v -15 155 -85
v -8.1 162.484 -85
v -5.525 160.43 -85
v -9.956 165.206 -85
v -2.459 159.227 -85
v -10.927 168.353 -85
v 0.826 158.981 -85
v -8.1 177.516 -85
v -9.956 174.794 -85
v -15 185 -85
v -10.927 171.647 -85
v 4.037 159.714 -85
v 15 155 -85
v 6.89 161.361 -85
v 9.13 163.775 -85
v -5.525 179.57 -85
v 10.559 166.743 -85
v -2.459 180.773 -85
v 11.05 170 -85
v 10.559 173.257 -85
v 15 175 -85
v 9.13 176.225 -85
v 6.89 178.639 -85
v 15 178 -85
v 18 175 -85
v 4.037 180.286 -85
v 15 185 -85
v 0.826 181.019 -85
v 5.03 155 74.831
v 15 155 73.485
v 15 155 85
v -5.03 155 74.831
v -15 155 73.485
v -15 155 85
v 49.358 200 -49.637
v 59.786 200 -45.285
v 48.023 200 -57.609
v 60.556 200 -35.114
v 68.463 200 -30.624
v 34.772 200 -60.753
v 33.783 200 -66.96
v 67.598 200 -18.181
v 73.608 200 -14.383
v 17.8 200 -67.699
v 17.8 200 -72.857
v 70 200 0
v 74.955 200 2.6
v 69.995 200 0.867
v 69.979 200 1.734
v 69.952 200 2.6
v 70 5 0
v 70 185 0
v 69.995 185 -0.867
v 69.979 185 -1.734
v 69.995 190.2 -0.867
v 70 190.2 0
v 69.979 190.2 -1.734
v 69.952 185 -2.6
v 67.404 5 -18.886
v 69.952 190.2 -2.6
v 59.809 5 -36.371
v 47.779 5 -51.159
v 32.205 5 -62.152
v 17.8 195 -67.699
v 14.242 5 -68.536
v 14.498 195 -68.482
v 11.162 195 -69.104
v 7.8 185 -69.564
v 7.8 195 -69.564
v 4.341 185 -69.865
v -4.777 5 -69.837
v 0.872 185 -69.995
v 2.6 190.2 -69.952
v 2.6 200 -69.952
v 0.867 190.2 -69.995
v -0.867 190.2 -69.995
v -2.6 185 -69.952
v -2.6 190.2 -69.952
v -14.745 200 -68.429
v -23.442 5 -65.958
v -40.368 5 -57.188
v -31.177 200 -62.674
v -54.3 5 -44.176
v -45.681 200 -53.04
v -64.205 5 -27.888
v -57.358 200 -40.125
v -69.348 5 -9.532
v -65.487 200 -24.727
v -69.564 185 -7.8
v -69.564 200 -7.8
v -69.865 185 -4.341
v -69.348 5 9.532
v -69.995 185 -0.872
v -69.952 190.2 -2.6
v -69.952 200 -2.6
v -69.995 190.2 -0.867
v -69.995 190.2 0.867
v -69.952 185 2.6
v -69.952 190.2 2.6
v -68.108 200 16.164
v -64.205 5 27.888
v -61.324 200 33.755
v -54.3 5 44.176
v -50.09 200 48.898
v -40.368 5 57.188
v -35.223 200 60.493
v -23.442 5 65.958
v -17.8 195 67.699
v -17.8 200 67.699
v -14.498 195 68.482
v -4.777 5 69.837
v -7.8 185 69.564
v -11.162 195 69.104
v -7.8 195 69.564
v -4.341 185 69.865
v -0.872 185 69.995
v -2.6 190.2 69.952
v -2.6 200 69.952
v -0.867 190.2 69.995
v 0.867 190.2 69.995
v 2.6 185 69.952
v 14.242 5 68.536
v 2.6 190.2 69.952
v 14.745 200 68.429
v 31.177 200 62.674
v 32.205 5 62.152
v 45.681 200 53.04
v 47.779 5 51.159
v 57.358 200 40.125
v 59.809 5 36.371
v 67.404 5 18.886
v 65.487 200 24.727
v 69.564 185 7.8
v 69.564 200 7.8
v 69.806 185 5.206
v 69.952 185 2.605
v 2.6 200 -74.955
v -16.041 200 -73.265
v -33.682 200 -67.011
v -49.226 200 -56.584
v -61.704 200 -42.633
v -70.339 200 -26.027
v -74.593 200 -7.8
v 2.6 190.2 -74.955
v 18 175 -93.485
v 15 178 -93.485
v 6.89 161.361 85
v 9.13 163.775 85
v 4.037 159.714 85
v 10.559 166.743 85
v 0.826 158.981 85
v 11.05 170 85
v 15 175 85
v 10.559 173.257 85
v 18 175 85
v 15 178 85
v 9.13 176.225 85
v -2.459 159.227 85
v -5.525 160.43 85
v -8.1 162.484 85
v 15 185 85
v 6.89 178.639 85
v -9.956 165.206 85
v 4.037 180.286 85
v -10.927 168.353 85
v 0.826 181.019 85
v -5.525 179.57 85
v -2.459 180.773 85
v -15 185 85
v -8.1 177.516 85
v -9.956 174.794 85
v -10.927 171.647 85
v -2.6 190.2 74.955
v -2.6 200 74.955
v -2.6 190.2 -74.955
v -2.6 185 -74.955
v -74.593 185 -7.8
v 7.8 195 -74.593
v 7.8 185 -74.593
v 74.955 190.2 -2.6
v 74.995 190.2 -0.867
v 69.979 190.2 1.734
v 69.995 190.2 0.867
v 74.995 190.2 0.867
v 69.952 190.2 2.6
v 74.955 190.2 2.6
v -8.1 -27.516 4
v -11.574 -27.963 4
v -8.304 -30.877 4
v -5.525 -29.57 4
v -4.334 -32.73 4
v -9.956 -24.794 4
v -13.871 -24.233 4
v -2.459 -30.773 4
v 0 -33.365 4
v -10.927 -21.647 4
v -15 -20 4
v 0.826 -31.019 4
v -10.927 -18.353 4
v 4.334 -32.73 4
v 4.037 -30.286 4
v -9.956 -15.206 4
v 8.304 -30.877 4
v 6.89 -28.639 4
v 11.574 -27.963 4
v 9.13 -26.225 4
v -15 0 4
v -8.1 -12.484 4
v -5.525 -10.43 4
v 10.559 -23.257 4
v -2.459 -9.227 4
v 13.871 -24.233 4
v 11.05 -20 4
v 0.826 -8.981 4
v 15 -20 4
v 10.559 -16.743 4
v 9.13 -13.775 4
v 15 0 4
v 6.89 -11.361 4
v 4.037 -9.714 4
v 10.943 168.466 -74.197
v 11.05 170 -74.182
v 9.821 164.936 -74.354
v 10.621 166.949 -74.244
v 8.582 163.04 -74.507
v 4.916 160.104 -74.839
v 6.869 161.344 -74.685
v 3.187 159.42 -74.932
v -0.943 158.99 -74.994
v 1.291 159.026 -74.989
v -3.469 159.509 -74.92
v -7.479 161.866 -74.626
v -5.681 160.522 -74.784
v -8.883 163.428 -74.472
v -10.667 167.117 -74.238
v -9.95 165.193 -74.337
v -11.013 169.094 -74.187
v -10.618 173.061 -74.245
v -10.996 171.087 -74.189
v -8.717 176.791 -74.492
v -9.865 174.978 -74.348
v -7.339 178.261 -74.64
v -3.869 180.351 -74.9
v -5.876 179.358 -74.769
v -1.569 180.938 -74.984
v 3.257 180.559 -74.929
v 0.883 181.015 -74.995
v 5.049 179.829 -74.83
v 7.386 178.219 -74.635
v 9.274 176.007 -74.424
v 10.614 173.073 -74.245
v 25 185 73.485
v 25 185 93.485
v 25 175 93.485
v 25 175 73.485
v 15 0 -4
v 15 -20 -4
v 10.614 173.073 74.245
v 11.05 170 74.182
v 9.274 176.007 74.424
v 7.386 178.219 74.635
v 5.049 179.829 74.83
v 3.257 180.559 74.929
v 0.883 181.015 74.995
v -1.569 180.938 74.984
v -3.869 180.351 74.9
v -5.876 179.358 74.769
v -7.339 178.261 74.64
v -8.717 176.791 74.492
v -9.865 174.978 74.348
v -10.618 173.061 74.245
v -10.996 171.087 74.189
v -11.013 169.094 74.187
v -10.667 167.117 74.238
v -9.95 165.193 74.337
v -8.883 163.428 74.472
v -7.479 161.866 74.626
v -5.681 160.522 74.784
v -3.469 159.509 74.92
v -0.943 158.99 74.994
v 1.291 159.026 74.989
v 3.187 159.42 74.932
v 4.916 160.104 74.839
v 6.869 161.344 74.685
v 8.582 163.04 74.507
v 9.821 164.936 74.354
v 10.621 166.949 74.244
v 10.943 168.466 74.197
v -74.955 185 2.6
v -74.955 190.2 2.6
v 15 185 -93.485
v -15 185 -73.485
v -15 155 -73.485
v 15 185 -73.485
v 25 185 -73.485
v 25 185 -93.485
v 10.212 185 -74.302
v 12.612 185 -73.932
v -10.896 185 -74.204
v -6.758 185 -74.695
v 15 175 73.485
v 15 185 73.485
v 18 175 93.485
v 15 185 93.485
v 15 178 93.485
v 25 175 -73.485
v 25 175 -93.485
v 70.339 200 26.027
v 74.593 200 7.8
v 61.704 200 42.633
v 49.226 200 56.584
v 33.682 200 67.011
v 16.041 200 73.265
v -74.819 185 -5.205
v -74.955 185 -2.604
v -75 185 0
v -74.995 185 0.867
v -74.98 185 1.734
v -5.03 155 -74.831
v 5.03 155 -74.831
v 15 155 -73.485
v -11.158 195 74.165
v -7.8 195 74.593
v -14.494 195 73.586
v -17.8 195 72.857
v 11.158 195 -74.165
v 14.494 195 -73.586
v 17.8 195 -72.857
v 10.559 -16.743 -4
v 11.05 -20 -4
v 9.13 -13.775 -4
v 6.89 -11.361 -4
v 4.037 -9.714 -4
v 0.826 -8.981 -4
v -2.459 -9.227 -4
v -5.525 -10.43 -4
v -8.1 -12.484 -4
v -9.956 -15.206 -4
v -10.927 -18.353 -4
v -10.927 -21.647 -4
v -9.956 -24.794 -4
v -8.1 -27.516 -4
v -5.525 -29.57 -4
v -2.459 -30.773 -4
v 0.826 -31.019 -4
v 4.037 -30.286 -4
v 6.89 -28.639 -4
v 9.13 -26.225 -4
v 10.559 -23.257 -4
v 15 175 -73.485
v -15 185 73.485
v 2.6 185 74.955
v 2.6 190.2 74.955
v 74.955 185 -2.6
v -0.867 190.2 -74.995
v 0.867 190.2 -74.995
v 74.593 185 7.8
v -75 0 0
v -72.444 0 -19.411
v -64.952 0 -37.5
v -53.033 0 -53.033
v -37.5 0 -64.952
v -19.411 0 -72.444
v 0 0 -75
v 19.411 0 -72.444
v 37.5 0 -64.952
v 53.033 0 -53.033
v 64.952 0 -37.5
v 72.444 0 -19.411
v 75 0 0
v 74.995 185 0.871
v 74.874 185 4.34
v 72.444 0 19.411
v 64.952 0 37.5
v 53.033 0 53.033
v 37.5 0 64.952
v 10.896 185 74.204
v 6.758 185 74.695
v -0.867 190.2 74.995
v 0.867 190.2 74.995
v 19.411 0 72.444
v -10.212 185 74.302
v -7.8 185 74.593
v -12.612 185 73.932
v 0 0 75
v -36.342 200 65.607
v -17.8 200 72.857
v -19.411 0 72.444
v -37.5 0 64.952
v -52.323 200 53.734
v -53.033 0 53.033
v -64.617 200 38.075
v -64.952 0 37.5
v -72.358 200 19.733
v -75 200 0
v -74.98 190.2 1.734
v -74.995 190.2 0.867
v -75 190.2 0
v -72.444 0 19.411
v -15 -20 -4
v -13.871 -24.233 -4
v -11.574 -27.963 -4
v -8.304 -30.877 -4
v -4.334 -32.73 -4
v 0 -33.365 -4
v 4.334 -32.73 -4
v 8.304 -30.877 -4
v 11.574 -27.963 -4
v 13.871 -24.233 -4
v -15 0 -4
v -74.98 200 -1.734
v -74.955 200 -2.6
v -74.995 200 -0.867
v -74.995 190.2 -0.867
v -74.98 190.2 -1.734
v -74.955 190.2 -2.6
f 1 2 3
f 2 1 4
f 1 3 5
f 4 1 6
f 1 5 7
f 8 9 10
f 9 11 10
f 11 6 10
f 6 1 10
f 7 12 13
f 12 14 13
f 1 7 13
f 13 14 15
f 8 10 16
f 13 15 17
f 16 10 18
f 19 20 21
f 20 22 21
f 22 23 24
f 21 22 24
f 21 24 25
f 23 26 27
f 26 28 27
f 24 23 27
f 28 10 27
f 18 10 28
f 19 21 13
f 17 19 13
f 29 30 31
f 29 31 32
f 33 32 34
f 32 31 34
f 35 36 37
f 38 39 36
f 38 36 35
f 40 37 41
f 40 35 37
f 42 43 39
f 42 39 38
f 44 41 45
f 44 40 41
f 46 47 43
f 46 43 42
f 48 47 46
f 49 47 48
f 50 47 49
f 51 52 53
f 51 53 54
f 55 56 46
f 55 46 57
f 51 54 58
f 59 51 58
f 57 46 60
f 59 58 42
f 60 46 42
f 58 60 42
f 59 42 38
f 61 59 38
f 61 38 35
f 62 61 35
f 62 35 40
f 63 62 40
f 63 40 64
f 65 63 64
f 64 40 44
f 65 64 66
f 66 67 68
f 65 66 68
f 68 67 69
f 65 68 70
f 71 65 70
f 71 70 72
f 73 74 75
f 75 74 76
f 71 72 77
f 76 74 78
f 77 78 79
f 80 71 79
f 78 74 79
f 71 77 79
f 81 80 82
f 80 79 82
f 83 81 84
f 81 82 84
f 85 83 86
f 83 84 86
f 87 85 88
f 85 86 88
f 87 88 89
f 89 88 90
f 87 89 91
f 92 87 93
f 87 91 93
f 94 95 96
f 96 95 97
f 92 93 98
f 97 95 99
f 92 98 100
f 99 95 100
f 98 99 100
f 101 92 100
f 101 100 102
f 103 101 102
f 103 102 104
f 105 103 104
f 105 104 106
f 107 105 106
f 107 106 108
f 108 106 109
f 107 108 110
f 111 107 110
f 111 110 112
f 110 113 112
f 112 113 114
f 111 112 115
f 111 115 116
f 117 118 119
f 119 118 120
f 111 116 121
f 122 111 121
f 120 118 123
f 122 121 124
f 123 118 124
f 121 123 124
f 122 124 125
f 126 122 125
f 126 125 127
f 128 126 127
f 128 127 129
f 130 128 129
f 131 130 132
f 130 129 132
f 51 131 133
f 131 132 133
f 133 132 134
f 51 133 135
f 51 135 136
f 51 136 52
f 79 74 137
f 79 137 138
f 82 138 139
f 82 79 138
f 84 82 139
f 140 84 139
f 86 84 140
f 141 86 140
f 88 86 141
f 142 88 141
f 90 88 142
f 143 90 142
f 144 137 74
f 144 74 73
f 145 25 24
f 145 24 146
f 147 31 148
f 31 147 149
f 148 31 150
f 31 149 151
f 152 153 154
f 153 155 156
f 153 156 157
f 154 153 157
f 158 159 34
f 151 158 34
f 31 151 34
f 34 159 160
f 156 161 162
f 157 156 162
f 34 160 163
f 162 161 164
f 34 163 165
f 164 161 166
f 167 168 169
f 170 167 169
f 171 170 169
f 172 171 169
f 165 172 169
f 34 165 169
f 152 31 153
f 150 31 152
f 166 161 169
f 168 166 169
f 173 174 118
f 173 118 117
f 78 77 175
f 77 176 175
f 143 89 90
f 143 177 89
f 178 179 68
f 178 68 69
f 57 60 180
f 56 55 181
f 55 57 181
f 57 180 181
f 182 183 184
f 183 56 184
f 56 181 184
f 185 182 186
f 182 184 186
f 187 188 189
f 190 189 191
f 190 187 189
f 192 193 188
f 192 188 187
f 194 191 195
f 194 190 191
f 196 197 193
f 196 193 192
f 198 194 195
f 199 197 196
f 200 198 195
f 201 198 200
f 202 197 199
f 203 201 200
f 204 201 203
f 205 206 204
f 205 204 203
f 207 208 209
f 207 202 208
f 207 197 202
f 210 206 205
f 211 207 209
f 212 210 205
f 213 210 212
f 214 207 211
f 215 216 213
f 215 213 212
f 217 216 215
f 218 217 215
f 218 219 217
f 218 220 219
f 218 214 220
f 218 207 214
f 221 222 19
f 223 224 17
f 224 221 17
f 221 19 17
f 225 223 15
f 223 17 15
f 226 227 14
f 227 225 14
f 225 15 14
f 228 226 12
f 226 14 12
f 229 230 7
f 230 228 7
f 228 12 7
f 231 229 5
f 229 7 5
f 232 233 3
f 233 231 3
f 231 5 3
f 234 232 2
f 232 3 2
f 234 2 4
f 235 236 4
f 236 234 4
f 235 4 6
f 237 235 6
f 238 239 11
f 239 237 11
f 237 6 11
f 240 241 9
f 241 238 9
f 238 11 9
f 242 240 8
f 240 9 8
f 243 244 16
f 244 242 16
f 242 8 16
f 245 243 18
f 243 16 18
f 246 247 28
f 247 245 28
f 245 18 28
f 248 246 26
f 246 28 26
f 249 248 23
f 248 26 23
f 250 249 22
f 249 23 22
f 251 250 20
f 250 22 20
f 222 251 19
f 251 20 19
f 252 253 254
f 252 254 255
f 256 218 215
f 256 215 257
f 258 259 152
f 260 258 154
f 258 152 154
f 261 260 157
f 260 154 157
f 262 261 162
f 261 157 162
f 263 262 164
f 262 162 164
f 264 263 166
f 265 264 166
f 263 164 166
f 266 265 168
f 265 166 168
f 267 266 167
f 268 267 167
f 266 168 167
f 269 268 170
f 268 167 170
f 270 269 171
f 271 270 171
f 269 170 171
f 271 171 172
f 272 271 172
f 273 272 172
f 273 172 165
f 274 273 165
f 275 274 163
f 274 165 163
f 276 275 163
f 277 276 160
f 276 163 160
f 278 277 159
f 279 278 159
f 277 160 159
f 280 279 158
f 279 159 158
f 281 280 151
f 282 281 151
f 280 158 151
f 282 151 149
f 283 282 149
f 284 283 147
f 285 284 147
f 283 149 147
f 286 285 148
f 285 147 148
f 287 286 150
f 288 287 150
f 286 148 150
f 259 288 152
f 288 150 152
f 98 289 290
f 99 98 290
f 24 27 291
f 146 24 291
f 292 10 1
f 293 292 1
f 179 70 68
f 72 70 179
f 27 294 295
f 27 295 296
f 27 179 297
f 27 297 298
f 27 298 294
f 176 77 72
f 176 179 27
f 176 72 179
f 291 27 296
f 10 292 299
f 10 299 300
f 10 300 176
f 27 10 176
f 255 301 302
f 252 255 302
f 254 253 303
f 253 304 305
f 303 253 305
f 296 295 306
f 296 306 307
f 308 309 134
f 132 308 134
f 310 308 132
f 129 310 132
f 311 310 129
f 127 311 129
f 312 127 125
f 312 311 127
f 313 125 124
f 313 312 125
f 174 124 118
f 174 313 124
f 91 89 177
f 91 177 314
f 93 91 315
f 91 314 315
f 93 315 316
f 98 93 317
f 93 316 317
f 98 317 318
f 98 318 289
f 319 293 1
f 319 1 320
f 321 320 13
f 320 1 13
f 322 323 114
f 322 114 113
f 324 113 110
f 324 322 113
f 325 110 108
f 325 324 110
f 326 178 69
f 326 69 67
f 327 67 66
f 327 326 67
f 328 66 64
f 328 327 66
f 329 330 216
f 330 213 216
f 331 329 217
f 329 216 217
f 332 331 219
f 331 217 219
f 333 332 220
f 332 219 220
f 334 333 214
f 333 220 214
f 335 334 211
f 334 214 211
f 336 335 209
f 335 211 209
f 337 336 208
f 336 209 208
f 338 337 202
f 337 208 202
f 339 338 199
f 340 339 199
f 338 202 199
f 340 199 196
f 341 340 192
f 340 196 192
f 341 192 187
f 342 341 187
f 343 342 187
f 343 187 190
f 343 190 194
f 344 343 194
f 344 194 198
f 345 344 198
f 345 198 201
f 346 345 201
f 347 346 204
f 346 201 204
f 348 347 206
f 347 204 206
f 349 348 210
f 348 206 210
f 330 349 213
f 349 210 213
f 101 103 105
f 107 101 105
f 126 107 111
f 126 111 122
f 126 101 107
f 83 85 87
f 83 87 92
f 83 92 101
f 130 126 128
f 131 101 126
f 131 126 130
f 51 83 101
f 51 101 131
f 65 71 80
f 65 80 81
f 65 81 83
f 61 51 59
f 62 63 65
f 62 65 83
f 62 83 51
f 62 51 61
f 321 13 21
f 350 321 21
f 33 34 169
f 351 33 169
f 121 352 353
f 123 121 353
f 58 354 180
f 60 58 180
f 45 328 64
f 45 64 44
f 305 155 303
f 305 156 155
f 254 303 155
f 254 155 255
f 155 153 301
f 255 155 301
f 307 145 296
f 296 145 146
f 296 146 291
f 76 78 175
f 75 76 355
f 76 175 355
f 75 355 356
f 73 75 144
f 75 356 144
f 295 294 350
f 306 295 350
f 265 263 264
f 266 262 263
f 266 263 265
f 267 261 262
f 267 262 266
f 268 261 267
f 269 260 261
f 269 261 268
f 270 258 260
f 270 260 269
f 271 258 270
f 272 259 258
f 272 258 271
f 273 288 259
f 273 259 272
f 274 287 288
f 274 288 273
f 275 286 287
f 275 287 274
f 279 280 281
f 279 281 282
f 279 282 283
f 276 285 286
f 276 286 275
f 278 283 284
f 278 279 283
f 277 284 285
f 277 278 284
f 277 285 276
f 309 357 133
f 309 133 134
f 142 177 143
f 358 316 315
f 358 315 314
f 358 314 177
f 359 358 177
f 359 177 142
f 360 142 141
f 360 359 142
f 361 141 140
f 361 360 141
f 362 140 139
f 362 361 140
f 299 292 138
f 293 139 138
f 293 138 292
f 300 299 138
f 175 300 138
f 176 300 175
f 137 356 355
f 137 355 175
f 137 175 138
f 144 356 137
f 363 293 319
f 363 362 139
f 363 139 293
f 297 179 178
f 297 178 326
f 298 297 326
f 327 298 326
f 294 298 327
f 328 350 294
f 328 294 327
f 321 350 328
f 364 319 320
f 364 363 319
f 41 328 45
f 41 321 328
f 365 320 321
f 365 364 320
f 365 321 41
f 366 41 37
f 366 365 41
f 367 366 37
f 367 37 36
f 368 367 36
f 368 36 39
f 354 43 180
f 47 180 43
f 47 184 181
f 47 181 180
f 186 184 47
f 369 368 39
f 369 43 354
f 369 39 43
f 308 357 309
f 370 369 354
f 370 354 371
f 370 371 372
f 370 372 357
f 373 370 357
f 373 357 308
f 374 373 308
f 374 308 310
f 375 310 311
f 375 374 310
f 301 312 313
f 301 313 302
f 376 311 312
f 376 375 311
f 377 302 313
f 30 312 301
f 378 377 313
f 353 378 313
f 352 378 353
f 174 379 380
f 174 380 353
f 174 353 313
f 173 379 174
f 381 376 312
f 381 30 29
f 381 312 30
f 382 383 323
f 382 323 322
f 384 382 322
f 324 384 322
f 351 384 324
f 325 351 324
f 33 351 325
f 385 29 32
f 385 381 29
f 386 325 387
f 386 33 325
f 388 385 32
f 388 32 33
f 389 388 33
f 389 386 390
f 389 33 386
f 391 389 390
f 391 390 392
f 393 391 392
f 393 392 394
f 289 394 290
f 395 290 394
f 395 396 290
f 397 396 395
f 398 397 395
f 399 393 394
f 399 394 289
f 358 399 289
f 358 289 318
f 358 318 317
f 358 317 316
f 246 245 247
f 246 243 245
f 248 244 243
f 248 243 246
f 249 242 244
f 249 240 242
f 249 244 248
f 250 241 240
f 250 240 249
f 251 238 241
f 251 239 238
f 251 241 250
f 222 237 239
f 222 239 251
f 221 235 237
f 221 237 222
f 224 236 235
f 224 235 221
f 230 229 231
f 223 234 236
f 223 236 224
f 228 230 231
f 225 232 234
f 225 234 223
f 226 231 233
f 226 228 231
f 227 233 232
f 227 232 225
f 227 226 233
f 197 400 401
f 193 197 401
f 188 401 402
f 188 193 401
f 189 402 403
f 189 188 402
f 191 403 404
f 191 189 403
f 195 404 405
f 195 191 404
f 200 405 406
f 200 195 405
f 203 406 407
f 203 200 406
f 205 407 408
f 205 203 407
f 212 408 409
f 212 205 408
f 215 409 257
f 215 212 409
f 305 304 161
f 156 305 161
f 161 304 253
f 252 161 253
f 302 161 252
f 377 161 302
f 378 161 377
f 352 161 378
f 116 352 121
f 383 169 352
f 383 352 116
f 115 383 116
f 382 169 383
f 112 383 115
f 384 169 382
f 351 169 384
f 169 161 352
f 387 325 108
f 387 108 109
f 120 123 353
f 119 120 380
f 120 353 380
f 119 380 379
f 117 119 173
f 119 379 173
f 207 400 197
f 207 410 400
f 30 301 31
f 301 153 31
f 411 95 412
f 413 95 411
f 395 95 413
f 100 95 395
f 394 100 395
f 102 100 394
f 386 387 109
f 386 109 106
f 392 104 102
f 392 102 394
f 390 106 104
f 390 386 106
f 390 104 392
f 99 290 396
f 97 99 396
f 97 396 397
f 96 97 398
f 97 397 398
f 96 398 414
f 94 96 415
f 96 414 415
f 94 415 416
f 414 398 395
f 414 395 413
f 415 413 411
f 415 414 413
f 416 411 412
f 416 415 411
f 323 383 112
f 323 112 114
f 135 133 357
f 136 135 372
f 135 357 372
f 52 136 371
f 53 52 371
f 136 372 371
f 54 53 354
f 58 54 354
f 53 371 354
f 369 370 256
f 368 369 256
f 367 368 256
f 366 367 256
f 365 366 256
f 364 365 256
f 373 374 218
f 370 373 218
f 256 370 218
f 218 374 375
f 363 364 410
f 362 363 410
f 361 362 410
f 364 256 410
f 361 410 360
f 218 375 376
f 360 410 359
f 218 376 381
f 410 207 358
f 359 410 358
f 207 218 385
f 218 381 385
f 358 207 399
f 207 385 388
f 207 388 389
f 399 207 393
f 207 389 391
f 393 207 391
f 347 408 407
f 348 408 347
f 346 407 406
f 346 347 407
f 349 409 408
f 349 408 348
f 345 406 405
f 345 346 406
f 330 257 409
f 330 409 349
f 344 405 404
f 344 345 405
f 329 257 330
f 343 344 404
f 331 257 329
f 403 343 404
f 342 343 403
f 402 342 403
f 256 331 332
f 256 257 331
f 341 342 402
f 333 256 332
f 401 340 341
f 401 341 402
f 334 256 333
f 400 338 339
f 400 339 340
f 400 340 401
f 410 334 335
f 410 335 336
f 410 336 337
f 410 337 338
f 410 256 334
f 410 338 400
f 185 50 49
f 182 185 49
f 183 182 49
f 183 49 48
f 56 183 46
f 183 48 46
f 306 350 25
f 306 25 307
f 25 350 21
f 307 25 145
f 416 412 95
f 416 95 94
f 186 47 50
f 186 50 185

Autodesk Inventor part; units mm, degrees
ref_plane "YZ Plane" through (0, 0, 0) normal (1, 0, 0) x (0, 1, 0)
ref_plane "XZ Plane" through (0, 0, 0) normal (0, 1, 0) x (-1, 0, 0)
sketch "Sketch1" plane through (0, 0, 0) normal (0, 1, 0) x (-1, 0, 0)
  circle A0 centre (0, 0) radius 75
  dimension "d0" = 150
extrude "Extrusion1" add sketch "Sketch1" along normal blind 200
sketch "Sketch2" plane through (0, 200, 0) normal (0, 1, 0) x (1, 0, 0)
  circle A0 centre (0, 0) radius 75 projected
  circle A1 centre (0, 0) radius 70
  dimension "d3" = 5
extrude "Extrusion2" cut sketch "Sketch2" against normal blind 195 contours A1
ref_plane "Work Plane1" through (0, 0, -75) normal (0, 0, 1) x (1, 0, 0)
sketch "Sketch4" plane through (0, 0, -75) normal (0, 0, 1) x (1, 0, 0)
  line L0 (15, 185) -> (-15, 185)
  line L1 (-15, 185) -> (-15, 155)
  line L2 (-15, 155) -> (15, 155)
  line L3 (15, 155) -> (15, 185)
  line L4 (15, 185) -> (-15, 155) construction
  line L5 (-15, 185) -> (15, 155) construction
  line L6 (75, 200) -> (-75, 200) construction
  line L7 (0, 170) -> (0, 200) construction
  circle A0 centre (0, 170) radius 11.05
  point P0 (0, 0)
  dimension "d8" = 30
  dimension "d9" = 30
  dimension "d10" = 30
  dimension "d15" = 22.1
extrude "Extrusion3" add sketch "Sketch4" along normal blind 3 and the other way blind 10
mirror "Mirror1" about plane through (0, 0, 0) normal (0, 0, 1) of "Extrusion3"
sketch "Sketch5" plane through (0, 0, 0) normal (0, -1, 0) x (1, 0, 0)
  line L0 (15, -4) -> (-15, -4)
  line L1 (-15, -4) -> (-15, 4)
  line L2 (-15, 4) -> (15, 4)
  line L3 (15, 4) -> (15, -4)
  line L4 (15, -4) -> (-15, 4) construction
  line L5 (-15, -4) -> (15, 4) construction
  circle A0 centre (0, 0) radius 75 projected
  dimension "d27" = 30
  dimension "d28" = 8
extrude "Extrusion4" add sketch "Sketch5" along normal blind 35 contours L0 L1 L2 L3
sketch "Sketch7" plane through (-15, 0, 4) normal (0, 0, 1) x (1, 0, 0)
  circle A0 centre (15, -20) radius 11.05
  line L0 (0, 0) -> (0, -35) projected
  line L1 (30, -35) -> (0, -35) projected
  point P0 (15, 0)
  dimension "d29" = 22.1
  dimension "d30" = 15
  dimension "d31" = 15
extrude "Extrusion6" cut sketch "Sketch7" against normal up to surface (8 mm away)
sketch "Sketch8" plane through (-15, 0, 4) normal (0, 0, 1) x (1, 0, 0)
  circle A0 centre (15, -20) radius 11.05 projected
  line L0 (0, 0) -> (30, 0) projected
  line L1 (0, 0) -> (0, -35) projected
  line L2 (30, -35) -> (0, -35) projected
  line L3 (30, 0) -> (30, -35) projected
  arc A1 (0, -20) -> (30, -20) centre (15, -18.2651) ccw
  line L4 (0, -20) -> (30, -20)
  line L5 (30, -20) -> (30, -35)
  line L6 (30, -35) -> (0, -35)
  line L7 (0, -35) -> (0, -20)
  dimension "d37" = 15.1
extrude "Extrusion8" cut sketch "Sketch8" against normal blind 35 contours L3 L2 L1 A1
sketch "Sketch9" plane through (15, 155, 73.4847) normal (1, 0, 0) x (0, 0, -1)
  line L0 (-11.5153, 30) -> (0, 30) projected
  line L1 (0, 30) -> (-20, 30)
  line L2 (-20, 30) -> (-20, 20)
  line L3 (-20, 20) -> (0, 20)
  line L4 (0, 20) -> (0, 30)
  point P0 (73.4847, -155)
  dimension "d40" = 20
  dimension "d41" = 10
extrude "Extrusion9" add sketch "Sketch9" along normal blind 10
mirror "Mirror2" about plane through (0, 0, 0) normal (0, 0, 1) of "Extrusion9"
chamfer "Chamfer1" distance 3 angle 45 2 edges at (15, 175, 89.2423) (15, 175, -89.2423)
ref_plane "Work Plane2" through (0, 0, 75) normal (0, 0, 1) x (1, 0, 0)
sketch "Sketch10" plane through (0, 0, 75) normal (0, 0, 1) x (1, 0, 0)
  line L0 (2.6, 190.2) -> (-2.6, 190.2)
  line L1 (-2.6, 190.2) -> (-2.6, 185)
  line L2 (-2.6, 185) -> (2.6, 185)
  line L3 (2.6, 185) -> (2.6, 190.2)
  line L4 (-15, 155) -> (-15, 185) projected
  line L5 (15, 155) -> (-15, 155) projected
  line L6 (15, 175) -> (15, 155) projected
  line L7 (15, 175) -> (18, 175) projected
  line L8 (18, 175) -> (15, 178) projected
  line L9 (15, 185) -> (15, 178) projected
  line L10 (-15, 185) -> (15, 185) projected
  circle A0 centre (0, 170) radius 11.05 projected
  line L11 (15, 185) -> (-15, 185) construction
  line L12 (0, 185) -> (0, 170) construction
  line L13 (-70, 200) -> (70, 200) projected
  line L14 (-2.6, 185) -> (-7.8, 185)
  line L15 (-7.8, 185) -> (-7.8, 200)
  line L16 (-7.8, 200) -> (-2.6, 200)
  line L17 (-2.6, 200) -> (-2.6, 185)
  point P0 (0, 0)
  dimension "d50" = 5.2
  dimension "d51" = 5.2
  dimension "d52" = 5.2
extrude "Extrusion10" cut sketch "Sketch10" against normal up to surface contours L3 L2 L1 L0 | L1 L10 L15 L13 L17
pattern_circular "Circular Pattern1" count 4 over 360 about axis through (0, 200, 0) along (0, -1, 0) of "Extrusion10"
sketch "Sketch11" plane through (0, 0, 75) normal (0, 0, 1) x (1, 0, 0)
  line L0 (-70, 5) -> (70, 5) projected
  line L1 (69.5641, 200) -> (69.5641, 185) projected
  line L2 (69.5641, 185) -> (69.9517, 185) projected
  line L3 (69.9517, 185) -> (69.9517, 190.2) projected
  line L4 (69.9517, 190.2) -> (69.9517, 190.2) projected
  line L5 (69.9517, 190.2) -> (69.9517, 200) projected
  line L6 (7.8, 200) -> (69.9517, 200) projected
  line L7 (7.8, 200) -> (7.8, 185) projected
  line L8 (7.8, 185) -> (-2.6, 185) projected
  line L9 (-2.6, 185) -> (-2.6, 190.2) projected
  line L10 (-2.6, 190.2) -> (2.6, 190.2) projected
  line L11 (2.6, 190.2) -> (2.6, 200) projected
  line L12 (-69.5641, 200) -> (2.6, 200) projected
  line L13 (-69.5641, 200) -> (-69.5641, 185) projected
  line L14 (-69.5641, 185) -> (-69.9517, 185) projected
  line L15 (-69.9517, 185) -> (-69.9517, 190.2) projected
  line L16 (-69.9517, 190.2) -> (-69.9517, 190.2) projected
  line L17 (-69.9517, 190.2) -> (-69.9517, 200) projected
  line L18 (-7.8, 200) -> (-69.9517, 200) projected
  line L19 (-7.8, 200) -> (-7.8, 185) projected
  line L20 (-7.8, 185) -> (2.6, 185) projected
  line L21 (2.6, 185) -> (2.6, 190.2) projected
  line L22 (2.6, 190.2) -> (-2.6, 190.2) projected
  line L23 (-2.6, 190.2) -> (-2.6, 200) projected
  line L24 (69.5641, 200) -> (-2.6, 200) projected
  line L25 (-17.8, 200) -> (-7.8, 200)
  line L26 (-7.8, 200) -> (-7.8, 195)
  line L27 (-7.8, 195) -> (-17.8, 195)
  line L28 (-17.8, 195) -> (-17.8, 200)
  point P0 (0, 0)
  dimension "d58" = 10
  dimension "d59" = 5
extrude "Extrusion11" cut sketch "Sketch11" against normal up to surface contours L19 L27 L28 L12
pattern_circular "Circular Pattern2" count 2 over 360 about axis through (0, 0, 0) along (0, 1, 0) of "Extrusion11"
properties part number "main_body"
